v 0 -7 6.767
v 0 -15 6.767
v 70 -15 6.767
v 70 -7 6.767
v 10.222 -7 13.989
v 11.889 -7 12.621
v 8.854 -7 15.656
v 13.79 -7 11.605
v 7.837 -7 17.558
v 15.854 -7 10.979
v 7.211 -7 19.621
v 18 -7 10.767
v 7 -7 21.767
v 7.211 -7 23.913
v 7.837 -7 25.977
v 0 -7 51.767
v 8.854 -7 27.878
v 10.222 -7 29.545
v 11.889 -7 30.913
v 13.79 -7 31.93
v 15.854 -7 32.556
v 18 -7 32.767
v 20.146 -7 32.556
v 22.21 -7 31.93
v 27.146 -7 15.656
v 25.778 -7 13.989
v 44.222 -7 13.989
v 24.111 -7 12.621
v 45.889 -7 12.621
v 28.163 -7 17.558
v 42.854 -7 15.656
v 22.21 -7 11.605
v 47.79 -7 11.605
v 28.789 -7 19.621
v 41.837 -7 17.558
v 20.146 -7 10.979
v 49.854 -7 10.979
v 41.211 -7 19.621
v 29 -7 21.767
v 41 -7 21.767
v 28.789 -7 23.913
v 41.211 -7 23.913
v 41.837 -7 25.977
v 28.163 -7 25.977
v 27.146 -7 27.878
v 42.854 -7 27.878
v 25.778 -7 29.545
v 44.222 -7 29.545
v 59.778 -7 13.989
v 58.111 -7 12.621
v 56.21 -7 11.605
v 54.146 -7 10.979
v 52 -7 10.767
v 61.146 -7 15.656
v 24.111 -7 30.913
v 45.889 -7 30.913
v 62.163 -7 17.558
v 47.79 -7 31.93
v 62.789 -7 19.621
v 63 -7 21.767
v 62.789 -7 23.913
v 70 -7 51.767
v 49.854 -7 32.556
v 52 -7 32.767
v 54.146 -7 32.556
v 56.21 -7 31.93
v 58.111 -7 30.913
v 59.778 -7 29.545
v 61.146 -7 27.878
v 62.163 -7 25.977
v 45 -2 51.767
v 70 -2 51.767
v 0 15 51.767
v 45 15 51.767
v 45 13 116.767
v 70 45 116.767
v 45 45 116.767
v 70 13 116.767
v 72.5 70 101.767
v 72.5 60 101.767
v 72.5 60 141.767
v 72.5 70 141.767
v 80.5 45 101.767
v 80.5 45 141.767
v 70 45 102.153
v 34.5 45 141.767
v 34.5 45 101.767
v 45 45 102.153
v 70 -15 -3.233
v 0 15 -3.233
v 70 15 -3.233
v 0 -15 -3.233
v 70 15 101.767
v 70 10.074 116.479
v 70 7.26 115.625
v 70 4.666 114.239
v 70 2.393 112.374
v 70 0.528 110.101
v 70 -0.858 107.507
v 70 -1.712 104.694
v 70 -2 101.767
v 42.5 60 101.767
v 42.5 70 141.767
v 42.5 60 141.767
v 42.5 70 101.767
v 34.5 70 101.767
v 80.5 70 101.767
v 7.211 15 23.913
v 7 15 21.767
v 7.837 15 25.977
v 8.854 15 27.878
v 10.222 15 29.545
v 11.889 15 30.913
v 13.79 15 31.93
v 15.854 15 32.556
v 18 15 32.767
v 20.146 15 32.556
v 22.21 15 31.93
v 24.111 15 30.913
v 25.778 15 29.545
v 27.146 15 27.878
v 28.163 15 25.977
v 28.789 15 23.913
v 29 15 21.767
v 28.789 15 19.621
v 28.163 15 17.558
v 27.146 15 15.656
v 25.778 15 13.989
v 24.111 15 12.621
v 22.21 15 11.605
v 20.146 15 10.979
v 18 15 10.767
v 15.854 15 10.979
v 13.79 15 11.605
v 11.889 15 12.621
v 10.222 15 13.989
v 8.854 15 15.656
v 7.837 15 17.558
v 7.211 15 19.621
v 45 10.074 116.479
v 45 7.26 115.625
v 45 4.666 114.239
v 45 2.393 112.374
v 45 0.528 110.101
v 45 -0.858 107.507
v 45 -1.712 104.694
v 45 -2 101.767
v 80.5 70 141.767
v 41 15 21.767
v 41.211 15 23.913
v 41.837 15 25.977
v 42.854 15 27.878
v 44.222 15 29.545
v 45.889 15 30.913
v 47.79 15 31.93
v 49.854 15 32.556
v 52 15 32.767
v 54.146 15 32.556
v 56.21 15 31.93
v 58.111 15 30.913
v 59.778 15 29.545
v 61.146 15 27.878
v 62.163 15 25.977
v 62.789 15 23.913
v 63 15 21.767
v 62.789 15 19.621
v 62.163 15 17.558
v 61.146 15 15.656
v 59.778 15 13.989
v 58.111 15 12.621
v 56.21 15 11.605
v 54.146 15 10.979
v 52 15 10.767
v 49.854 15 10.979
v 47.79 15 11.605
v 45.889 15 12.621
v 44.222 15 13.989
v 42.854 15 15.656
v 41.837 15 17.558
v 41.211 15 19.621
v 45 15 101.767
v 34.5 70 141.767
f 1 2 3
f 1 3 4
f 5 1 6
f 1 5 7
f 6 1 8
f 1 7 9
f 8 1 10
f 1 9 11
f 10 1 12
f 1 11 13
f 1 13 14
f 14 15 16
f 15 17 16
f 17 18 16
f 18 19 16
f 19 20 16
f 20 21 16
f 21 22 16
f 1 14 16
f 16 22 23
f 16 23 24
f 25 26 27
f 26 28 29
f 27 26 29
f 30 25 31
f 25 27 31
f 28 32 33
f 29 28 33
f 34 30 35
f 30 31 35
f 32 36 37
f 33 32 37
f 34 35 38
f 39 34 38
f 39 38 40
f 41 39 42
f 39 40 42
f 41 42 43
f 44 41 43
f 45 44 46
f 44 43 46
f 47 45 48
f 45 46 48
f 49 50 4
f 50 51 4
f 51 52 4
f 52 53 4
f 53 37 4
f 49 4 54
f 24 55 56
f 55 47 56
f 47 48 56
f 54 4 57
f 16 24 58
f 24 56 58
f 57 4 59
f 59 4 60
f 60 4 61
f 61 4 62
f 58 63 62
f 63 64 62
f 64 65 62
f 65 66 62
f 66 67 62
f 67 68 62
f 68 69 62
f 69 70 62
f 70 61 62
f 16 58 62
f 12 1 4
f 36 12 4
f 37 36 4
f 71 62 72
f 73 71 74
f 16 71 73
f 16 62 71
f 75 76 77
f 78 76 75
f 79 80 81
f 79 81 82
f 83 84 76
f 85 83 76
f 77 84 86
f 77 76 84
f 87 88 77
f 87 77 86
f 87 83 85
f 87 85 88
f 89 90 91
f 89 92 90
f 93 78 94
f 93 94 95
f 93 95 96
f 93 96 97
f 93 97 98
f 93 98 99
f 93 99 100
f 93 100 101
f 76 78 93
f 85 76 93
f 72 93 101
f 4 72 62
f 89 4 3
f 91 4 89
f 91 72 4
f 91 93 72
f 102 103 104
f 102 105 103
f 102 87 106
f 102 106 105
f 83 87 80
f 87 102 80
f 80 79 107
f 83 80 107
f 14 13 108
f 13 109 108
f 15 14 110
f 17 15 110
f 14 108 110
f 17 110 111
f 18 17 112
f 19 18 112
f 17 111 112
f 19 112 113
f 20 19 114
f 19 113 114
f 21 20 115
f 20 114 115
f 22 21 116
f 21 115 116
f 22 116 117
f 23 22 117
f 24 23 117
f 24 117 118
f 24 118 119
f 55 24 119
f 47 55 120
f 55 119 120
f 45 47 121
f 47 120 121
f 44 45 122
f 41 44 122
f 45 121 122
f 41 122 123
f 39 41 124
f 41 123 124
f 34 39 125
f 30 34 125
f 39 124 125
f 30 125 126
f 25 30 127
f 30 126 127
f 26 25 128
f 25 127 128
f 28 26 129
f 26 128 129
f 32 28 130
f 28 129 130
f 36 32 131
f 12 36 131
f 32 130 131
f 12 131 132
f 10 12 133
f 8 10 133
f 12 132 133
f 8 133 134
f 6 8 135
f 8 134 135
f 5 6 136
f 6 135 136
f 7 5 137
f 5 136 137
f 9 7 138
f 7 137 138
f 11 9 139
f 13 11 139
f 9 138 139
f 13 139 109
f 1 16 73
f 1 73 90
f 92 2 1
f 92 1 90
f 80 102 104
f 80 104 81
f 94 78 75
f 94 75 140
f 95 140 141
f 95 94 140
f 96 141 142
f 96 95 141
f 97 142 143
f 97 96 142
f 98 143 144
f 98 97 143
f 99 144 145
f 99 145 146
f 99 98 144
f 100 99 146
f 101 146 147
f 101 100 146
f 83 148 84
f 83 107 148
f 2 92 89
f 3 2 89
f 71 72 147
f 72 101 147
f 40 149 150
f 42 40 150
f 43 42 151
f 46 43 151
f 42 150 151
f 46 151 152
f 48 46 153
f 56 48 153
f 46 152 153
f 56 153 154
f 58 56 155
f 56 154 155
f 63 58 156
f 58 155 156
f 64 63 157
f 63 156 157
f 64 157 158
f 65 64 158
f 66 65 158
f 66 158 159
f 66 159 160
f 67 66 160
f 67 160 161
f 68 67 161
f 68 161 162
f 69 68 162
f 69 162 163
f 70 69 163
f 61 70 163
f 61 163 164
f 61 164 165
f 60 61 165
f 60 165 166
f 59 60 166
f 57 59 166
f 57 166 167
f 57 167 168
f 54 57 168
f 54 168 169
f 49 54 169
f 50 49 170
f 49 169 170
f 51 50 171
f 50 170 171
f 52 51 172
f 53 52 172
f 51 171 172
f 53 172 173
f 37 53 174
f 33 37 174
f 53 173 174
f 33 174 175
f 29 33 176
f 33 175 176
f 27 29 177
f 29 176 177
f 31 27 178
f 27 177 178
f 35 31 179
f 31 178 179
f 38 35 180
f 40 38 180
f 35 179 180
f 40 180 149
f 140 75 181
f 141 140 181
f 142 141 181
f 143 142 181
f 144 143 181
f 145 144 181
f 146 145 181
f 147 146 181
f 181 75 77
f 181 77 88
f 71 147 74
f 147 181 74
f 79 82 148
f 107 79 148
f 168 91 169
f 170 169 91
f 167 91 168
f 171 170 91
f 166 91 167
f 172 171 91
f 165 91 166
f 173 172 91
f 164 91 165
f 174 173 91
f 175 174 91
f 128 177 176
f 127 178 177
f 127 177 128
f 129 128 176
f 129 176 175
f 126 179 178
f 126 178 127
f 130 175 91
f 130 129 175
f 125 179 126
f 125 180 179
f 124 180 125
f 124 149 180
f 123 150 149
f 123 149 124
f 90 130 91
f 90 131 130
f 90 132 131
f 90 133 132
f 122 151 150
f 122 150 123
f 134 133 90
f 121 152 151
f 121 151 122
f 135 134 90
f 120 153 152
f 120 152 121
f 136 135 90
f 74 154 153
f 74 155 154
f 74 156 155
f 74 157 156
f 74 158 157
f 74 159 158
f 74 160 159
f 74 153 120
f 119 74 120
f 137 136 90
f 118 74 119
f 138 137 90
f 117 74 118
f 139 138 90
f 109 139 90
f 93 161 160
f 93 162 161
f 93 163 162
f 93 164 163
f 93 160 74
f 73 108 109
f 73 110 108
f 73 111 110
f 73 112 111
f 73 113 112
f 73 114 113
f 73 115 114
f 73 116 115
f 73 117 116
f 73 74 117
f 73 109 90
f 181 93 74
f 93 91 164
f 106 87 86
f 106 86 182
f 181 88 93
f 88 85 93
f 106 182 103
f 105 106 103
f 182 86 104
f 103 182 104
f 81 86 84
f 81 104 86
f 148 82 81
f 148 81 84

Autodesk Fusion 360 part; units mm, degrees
sketch "Sketch1" plane through (0, 0, 0) normal (0, 1, 0) x (1, 0, 0)
  line L0 (0, 3.2328) -> (70, 3.2328)
  line L1 (70, 3.2328) -> (70, -51.7672)
  line L2 (70, -51.7672) -> (0, -51.7672)
  line L3 (0, -51.7672) -> (0, 3.2328)
  dimension "d1" = 70
  dimension "d2" = 55
  dimension "d3" = 55
extrude "Extrude1" add sketch "Sketch1" along normal mid plane 30
sketch "Sketch2" plane through (70, 0, 0) normal (1, 0, 0) x (0, 0, -1)
  line L0 (3.2328, -15) -> (3.2328, 15)
  line L1 (3.2328, 15) -> (-51.7672, 15)
  line L2 (-51.7672, 15) -> (-51.7672, -15)
  line L3 (-51.7672, -15) -> (3.2328, -15)
  line L4 (-6.7672, -15) -> (-6.7672, -7)
  line L5 (-6.7672, -7) -> (-51.7672, -7)
  dimension "d6" = 10
  dimension "d7" = 45
  dimension "d8" = 8
extrude "Extrude2" cut sketch "Sketch2" against normal blind 90 contours L2 L3 L4 L5
sketch "Sketch3" plane through (0, 15, 0) normal (0, 1, 0) x (-1, 0, 0)
  line L0 (0, 51.7672) -> (-70, 51.7672)
  line L1 (-70, 51.7672) -> (-70, -3.2328)
  line L2 (-70, -3.2328) -> (0, -3.2328)
  line L3 (0, -3.2328) -> (0, 51.7672)
  circle A0 centre (-18, 21.7672) radius 11
  circle A1 centre (-52, 21.7672) radius 11
  dimension "d11" = 22
  dimension "d12" = 22
  dimension "d13" = 30
  dimension "d14" = 18
  dimension "d15" = 34
extrude "Extrude3" cut sketch "Sketch3" against normal blind 50 contours A0 | A1
sketch "Sketch4" plane through (0, 15, 0) normal (0, 1, 0) x (-1, 0, 0)
  circle A0 centre (-52, 21.7672) radius 11
  circle A1 centre (-18, 21.7672) radius 11
  line L0 (0, 51.7672) -> (-70, 51.7672)
  line L1 (-70, 51.7672) -> (-70, -3.2328)
  line L2 (-70, -3.2328) -> (0, -3.2328)
  line L3 (0, -3.2328) -> (0, 51.7672)
  line L4 (-45, 51.7672) -> (-45, 101.7672)
  line L5 (-45, 101.7672) -> (-70, 101.7672)
  line L6 (-70, 101.7672) -> (-70, 51.7672)
  dimension "d18" = 50
  dimension "d19" = 50
  dimension "d20" = 25
extrude "Extrude4" add sketch "Sketch4" against normal blind 17 contours L0 L4 L5 L6
sketch "Sketch5" plane through (70, 0, 0) normal (1, 0, 0) x (0, 0, -1)
  line L0 (-51.7672, -7) -> (-6.7672, -7)
  line L1 (-6.7672, -7) -> (-6.7672, -15)
  line L2 (-6.7672, -15) -> (3.2328, -15)
  line L3 (3.2328, -15) -> (3.2328, 15)
  line L4 (3.2328, 15) -> (-101.7672, 15)
  line L5 (-101.7672, 15) -> (-101.7672, -2)
  line L6 (-101.7672, -2) -> (-51.7672, -2)
  line L7 (-51.7672, -2) -> (-51.7672, -7)
  line L8 (-170, 80) -> (-115.9179, 80)
  line L9 (-170, 60) -> (-114.0006, 60)
  line L10 (-116.7673, 45) -> (-116.7673, 13)
  arc A0 (-116.7673, 13) -> (-101.7672, -2) centre (-101.7673, 13) ccw
  line L11 (-116.7673, 45) -> (-102.1531, 45)
  line L12 (-102.1531, 45) -> (-101.7672, 15)
  dimension "d25" = 32
  dimension "d26" = 15
  dimension "d27" = 30
extrude "Extrude5" add sketch "Sketch5" against normal blind 25 contours L5 L10 A0 L11 L12
sketch "Sketch6" plane through (0, 0, 116.7673) normal (0, 0, 1) x (1, 0, 0)
  line L0 (70, 13) -> (70, 45)
  line L1 (70, 45) -> (45, 45)
  line L2 (45, 45) -> (45, 13)
  line L3 (45, 13) -> (70, 13)
  line L4 (45, 45) -> (34.5, 45)
  line L5 (34.5, 45) -> (34.5, 70)
  line L6 (34.5, 70) -> (42.5, 70)
  line L7 (42.5, 70) -> (42.5, 60)
  line L8 (42.5, 60) -> (72.5, 60)
  line L9 (72.5, 60) -> (72.5, 70)
  line L10 (72.5, 70) -> (80.5, 70)
  line L11 (80.5, 70) -> (80.5, 45)
  line L12 (80.5, 45) -> (70, 45)
  dimension "d30" = 25
  dimension "d31" = 8
  dimension "d32" = 8
  dimension "d33" = 25
  dimension "d34" = 10.5
  dimension "d35" = 10.5
  dimension "d36" = 30
  dimension "d37" = 46
extrude "Extrude6" add sketch "Sketch6" along normal blind 25 and the other way blind 15 contours L1 L4 L5 L6 L7 L8 L9 L10 L11 L12
